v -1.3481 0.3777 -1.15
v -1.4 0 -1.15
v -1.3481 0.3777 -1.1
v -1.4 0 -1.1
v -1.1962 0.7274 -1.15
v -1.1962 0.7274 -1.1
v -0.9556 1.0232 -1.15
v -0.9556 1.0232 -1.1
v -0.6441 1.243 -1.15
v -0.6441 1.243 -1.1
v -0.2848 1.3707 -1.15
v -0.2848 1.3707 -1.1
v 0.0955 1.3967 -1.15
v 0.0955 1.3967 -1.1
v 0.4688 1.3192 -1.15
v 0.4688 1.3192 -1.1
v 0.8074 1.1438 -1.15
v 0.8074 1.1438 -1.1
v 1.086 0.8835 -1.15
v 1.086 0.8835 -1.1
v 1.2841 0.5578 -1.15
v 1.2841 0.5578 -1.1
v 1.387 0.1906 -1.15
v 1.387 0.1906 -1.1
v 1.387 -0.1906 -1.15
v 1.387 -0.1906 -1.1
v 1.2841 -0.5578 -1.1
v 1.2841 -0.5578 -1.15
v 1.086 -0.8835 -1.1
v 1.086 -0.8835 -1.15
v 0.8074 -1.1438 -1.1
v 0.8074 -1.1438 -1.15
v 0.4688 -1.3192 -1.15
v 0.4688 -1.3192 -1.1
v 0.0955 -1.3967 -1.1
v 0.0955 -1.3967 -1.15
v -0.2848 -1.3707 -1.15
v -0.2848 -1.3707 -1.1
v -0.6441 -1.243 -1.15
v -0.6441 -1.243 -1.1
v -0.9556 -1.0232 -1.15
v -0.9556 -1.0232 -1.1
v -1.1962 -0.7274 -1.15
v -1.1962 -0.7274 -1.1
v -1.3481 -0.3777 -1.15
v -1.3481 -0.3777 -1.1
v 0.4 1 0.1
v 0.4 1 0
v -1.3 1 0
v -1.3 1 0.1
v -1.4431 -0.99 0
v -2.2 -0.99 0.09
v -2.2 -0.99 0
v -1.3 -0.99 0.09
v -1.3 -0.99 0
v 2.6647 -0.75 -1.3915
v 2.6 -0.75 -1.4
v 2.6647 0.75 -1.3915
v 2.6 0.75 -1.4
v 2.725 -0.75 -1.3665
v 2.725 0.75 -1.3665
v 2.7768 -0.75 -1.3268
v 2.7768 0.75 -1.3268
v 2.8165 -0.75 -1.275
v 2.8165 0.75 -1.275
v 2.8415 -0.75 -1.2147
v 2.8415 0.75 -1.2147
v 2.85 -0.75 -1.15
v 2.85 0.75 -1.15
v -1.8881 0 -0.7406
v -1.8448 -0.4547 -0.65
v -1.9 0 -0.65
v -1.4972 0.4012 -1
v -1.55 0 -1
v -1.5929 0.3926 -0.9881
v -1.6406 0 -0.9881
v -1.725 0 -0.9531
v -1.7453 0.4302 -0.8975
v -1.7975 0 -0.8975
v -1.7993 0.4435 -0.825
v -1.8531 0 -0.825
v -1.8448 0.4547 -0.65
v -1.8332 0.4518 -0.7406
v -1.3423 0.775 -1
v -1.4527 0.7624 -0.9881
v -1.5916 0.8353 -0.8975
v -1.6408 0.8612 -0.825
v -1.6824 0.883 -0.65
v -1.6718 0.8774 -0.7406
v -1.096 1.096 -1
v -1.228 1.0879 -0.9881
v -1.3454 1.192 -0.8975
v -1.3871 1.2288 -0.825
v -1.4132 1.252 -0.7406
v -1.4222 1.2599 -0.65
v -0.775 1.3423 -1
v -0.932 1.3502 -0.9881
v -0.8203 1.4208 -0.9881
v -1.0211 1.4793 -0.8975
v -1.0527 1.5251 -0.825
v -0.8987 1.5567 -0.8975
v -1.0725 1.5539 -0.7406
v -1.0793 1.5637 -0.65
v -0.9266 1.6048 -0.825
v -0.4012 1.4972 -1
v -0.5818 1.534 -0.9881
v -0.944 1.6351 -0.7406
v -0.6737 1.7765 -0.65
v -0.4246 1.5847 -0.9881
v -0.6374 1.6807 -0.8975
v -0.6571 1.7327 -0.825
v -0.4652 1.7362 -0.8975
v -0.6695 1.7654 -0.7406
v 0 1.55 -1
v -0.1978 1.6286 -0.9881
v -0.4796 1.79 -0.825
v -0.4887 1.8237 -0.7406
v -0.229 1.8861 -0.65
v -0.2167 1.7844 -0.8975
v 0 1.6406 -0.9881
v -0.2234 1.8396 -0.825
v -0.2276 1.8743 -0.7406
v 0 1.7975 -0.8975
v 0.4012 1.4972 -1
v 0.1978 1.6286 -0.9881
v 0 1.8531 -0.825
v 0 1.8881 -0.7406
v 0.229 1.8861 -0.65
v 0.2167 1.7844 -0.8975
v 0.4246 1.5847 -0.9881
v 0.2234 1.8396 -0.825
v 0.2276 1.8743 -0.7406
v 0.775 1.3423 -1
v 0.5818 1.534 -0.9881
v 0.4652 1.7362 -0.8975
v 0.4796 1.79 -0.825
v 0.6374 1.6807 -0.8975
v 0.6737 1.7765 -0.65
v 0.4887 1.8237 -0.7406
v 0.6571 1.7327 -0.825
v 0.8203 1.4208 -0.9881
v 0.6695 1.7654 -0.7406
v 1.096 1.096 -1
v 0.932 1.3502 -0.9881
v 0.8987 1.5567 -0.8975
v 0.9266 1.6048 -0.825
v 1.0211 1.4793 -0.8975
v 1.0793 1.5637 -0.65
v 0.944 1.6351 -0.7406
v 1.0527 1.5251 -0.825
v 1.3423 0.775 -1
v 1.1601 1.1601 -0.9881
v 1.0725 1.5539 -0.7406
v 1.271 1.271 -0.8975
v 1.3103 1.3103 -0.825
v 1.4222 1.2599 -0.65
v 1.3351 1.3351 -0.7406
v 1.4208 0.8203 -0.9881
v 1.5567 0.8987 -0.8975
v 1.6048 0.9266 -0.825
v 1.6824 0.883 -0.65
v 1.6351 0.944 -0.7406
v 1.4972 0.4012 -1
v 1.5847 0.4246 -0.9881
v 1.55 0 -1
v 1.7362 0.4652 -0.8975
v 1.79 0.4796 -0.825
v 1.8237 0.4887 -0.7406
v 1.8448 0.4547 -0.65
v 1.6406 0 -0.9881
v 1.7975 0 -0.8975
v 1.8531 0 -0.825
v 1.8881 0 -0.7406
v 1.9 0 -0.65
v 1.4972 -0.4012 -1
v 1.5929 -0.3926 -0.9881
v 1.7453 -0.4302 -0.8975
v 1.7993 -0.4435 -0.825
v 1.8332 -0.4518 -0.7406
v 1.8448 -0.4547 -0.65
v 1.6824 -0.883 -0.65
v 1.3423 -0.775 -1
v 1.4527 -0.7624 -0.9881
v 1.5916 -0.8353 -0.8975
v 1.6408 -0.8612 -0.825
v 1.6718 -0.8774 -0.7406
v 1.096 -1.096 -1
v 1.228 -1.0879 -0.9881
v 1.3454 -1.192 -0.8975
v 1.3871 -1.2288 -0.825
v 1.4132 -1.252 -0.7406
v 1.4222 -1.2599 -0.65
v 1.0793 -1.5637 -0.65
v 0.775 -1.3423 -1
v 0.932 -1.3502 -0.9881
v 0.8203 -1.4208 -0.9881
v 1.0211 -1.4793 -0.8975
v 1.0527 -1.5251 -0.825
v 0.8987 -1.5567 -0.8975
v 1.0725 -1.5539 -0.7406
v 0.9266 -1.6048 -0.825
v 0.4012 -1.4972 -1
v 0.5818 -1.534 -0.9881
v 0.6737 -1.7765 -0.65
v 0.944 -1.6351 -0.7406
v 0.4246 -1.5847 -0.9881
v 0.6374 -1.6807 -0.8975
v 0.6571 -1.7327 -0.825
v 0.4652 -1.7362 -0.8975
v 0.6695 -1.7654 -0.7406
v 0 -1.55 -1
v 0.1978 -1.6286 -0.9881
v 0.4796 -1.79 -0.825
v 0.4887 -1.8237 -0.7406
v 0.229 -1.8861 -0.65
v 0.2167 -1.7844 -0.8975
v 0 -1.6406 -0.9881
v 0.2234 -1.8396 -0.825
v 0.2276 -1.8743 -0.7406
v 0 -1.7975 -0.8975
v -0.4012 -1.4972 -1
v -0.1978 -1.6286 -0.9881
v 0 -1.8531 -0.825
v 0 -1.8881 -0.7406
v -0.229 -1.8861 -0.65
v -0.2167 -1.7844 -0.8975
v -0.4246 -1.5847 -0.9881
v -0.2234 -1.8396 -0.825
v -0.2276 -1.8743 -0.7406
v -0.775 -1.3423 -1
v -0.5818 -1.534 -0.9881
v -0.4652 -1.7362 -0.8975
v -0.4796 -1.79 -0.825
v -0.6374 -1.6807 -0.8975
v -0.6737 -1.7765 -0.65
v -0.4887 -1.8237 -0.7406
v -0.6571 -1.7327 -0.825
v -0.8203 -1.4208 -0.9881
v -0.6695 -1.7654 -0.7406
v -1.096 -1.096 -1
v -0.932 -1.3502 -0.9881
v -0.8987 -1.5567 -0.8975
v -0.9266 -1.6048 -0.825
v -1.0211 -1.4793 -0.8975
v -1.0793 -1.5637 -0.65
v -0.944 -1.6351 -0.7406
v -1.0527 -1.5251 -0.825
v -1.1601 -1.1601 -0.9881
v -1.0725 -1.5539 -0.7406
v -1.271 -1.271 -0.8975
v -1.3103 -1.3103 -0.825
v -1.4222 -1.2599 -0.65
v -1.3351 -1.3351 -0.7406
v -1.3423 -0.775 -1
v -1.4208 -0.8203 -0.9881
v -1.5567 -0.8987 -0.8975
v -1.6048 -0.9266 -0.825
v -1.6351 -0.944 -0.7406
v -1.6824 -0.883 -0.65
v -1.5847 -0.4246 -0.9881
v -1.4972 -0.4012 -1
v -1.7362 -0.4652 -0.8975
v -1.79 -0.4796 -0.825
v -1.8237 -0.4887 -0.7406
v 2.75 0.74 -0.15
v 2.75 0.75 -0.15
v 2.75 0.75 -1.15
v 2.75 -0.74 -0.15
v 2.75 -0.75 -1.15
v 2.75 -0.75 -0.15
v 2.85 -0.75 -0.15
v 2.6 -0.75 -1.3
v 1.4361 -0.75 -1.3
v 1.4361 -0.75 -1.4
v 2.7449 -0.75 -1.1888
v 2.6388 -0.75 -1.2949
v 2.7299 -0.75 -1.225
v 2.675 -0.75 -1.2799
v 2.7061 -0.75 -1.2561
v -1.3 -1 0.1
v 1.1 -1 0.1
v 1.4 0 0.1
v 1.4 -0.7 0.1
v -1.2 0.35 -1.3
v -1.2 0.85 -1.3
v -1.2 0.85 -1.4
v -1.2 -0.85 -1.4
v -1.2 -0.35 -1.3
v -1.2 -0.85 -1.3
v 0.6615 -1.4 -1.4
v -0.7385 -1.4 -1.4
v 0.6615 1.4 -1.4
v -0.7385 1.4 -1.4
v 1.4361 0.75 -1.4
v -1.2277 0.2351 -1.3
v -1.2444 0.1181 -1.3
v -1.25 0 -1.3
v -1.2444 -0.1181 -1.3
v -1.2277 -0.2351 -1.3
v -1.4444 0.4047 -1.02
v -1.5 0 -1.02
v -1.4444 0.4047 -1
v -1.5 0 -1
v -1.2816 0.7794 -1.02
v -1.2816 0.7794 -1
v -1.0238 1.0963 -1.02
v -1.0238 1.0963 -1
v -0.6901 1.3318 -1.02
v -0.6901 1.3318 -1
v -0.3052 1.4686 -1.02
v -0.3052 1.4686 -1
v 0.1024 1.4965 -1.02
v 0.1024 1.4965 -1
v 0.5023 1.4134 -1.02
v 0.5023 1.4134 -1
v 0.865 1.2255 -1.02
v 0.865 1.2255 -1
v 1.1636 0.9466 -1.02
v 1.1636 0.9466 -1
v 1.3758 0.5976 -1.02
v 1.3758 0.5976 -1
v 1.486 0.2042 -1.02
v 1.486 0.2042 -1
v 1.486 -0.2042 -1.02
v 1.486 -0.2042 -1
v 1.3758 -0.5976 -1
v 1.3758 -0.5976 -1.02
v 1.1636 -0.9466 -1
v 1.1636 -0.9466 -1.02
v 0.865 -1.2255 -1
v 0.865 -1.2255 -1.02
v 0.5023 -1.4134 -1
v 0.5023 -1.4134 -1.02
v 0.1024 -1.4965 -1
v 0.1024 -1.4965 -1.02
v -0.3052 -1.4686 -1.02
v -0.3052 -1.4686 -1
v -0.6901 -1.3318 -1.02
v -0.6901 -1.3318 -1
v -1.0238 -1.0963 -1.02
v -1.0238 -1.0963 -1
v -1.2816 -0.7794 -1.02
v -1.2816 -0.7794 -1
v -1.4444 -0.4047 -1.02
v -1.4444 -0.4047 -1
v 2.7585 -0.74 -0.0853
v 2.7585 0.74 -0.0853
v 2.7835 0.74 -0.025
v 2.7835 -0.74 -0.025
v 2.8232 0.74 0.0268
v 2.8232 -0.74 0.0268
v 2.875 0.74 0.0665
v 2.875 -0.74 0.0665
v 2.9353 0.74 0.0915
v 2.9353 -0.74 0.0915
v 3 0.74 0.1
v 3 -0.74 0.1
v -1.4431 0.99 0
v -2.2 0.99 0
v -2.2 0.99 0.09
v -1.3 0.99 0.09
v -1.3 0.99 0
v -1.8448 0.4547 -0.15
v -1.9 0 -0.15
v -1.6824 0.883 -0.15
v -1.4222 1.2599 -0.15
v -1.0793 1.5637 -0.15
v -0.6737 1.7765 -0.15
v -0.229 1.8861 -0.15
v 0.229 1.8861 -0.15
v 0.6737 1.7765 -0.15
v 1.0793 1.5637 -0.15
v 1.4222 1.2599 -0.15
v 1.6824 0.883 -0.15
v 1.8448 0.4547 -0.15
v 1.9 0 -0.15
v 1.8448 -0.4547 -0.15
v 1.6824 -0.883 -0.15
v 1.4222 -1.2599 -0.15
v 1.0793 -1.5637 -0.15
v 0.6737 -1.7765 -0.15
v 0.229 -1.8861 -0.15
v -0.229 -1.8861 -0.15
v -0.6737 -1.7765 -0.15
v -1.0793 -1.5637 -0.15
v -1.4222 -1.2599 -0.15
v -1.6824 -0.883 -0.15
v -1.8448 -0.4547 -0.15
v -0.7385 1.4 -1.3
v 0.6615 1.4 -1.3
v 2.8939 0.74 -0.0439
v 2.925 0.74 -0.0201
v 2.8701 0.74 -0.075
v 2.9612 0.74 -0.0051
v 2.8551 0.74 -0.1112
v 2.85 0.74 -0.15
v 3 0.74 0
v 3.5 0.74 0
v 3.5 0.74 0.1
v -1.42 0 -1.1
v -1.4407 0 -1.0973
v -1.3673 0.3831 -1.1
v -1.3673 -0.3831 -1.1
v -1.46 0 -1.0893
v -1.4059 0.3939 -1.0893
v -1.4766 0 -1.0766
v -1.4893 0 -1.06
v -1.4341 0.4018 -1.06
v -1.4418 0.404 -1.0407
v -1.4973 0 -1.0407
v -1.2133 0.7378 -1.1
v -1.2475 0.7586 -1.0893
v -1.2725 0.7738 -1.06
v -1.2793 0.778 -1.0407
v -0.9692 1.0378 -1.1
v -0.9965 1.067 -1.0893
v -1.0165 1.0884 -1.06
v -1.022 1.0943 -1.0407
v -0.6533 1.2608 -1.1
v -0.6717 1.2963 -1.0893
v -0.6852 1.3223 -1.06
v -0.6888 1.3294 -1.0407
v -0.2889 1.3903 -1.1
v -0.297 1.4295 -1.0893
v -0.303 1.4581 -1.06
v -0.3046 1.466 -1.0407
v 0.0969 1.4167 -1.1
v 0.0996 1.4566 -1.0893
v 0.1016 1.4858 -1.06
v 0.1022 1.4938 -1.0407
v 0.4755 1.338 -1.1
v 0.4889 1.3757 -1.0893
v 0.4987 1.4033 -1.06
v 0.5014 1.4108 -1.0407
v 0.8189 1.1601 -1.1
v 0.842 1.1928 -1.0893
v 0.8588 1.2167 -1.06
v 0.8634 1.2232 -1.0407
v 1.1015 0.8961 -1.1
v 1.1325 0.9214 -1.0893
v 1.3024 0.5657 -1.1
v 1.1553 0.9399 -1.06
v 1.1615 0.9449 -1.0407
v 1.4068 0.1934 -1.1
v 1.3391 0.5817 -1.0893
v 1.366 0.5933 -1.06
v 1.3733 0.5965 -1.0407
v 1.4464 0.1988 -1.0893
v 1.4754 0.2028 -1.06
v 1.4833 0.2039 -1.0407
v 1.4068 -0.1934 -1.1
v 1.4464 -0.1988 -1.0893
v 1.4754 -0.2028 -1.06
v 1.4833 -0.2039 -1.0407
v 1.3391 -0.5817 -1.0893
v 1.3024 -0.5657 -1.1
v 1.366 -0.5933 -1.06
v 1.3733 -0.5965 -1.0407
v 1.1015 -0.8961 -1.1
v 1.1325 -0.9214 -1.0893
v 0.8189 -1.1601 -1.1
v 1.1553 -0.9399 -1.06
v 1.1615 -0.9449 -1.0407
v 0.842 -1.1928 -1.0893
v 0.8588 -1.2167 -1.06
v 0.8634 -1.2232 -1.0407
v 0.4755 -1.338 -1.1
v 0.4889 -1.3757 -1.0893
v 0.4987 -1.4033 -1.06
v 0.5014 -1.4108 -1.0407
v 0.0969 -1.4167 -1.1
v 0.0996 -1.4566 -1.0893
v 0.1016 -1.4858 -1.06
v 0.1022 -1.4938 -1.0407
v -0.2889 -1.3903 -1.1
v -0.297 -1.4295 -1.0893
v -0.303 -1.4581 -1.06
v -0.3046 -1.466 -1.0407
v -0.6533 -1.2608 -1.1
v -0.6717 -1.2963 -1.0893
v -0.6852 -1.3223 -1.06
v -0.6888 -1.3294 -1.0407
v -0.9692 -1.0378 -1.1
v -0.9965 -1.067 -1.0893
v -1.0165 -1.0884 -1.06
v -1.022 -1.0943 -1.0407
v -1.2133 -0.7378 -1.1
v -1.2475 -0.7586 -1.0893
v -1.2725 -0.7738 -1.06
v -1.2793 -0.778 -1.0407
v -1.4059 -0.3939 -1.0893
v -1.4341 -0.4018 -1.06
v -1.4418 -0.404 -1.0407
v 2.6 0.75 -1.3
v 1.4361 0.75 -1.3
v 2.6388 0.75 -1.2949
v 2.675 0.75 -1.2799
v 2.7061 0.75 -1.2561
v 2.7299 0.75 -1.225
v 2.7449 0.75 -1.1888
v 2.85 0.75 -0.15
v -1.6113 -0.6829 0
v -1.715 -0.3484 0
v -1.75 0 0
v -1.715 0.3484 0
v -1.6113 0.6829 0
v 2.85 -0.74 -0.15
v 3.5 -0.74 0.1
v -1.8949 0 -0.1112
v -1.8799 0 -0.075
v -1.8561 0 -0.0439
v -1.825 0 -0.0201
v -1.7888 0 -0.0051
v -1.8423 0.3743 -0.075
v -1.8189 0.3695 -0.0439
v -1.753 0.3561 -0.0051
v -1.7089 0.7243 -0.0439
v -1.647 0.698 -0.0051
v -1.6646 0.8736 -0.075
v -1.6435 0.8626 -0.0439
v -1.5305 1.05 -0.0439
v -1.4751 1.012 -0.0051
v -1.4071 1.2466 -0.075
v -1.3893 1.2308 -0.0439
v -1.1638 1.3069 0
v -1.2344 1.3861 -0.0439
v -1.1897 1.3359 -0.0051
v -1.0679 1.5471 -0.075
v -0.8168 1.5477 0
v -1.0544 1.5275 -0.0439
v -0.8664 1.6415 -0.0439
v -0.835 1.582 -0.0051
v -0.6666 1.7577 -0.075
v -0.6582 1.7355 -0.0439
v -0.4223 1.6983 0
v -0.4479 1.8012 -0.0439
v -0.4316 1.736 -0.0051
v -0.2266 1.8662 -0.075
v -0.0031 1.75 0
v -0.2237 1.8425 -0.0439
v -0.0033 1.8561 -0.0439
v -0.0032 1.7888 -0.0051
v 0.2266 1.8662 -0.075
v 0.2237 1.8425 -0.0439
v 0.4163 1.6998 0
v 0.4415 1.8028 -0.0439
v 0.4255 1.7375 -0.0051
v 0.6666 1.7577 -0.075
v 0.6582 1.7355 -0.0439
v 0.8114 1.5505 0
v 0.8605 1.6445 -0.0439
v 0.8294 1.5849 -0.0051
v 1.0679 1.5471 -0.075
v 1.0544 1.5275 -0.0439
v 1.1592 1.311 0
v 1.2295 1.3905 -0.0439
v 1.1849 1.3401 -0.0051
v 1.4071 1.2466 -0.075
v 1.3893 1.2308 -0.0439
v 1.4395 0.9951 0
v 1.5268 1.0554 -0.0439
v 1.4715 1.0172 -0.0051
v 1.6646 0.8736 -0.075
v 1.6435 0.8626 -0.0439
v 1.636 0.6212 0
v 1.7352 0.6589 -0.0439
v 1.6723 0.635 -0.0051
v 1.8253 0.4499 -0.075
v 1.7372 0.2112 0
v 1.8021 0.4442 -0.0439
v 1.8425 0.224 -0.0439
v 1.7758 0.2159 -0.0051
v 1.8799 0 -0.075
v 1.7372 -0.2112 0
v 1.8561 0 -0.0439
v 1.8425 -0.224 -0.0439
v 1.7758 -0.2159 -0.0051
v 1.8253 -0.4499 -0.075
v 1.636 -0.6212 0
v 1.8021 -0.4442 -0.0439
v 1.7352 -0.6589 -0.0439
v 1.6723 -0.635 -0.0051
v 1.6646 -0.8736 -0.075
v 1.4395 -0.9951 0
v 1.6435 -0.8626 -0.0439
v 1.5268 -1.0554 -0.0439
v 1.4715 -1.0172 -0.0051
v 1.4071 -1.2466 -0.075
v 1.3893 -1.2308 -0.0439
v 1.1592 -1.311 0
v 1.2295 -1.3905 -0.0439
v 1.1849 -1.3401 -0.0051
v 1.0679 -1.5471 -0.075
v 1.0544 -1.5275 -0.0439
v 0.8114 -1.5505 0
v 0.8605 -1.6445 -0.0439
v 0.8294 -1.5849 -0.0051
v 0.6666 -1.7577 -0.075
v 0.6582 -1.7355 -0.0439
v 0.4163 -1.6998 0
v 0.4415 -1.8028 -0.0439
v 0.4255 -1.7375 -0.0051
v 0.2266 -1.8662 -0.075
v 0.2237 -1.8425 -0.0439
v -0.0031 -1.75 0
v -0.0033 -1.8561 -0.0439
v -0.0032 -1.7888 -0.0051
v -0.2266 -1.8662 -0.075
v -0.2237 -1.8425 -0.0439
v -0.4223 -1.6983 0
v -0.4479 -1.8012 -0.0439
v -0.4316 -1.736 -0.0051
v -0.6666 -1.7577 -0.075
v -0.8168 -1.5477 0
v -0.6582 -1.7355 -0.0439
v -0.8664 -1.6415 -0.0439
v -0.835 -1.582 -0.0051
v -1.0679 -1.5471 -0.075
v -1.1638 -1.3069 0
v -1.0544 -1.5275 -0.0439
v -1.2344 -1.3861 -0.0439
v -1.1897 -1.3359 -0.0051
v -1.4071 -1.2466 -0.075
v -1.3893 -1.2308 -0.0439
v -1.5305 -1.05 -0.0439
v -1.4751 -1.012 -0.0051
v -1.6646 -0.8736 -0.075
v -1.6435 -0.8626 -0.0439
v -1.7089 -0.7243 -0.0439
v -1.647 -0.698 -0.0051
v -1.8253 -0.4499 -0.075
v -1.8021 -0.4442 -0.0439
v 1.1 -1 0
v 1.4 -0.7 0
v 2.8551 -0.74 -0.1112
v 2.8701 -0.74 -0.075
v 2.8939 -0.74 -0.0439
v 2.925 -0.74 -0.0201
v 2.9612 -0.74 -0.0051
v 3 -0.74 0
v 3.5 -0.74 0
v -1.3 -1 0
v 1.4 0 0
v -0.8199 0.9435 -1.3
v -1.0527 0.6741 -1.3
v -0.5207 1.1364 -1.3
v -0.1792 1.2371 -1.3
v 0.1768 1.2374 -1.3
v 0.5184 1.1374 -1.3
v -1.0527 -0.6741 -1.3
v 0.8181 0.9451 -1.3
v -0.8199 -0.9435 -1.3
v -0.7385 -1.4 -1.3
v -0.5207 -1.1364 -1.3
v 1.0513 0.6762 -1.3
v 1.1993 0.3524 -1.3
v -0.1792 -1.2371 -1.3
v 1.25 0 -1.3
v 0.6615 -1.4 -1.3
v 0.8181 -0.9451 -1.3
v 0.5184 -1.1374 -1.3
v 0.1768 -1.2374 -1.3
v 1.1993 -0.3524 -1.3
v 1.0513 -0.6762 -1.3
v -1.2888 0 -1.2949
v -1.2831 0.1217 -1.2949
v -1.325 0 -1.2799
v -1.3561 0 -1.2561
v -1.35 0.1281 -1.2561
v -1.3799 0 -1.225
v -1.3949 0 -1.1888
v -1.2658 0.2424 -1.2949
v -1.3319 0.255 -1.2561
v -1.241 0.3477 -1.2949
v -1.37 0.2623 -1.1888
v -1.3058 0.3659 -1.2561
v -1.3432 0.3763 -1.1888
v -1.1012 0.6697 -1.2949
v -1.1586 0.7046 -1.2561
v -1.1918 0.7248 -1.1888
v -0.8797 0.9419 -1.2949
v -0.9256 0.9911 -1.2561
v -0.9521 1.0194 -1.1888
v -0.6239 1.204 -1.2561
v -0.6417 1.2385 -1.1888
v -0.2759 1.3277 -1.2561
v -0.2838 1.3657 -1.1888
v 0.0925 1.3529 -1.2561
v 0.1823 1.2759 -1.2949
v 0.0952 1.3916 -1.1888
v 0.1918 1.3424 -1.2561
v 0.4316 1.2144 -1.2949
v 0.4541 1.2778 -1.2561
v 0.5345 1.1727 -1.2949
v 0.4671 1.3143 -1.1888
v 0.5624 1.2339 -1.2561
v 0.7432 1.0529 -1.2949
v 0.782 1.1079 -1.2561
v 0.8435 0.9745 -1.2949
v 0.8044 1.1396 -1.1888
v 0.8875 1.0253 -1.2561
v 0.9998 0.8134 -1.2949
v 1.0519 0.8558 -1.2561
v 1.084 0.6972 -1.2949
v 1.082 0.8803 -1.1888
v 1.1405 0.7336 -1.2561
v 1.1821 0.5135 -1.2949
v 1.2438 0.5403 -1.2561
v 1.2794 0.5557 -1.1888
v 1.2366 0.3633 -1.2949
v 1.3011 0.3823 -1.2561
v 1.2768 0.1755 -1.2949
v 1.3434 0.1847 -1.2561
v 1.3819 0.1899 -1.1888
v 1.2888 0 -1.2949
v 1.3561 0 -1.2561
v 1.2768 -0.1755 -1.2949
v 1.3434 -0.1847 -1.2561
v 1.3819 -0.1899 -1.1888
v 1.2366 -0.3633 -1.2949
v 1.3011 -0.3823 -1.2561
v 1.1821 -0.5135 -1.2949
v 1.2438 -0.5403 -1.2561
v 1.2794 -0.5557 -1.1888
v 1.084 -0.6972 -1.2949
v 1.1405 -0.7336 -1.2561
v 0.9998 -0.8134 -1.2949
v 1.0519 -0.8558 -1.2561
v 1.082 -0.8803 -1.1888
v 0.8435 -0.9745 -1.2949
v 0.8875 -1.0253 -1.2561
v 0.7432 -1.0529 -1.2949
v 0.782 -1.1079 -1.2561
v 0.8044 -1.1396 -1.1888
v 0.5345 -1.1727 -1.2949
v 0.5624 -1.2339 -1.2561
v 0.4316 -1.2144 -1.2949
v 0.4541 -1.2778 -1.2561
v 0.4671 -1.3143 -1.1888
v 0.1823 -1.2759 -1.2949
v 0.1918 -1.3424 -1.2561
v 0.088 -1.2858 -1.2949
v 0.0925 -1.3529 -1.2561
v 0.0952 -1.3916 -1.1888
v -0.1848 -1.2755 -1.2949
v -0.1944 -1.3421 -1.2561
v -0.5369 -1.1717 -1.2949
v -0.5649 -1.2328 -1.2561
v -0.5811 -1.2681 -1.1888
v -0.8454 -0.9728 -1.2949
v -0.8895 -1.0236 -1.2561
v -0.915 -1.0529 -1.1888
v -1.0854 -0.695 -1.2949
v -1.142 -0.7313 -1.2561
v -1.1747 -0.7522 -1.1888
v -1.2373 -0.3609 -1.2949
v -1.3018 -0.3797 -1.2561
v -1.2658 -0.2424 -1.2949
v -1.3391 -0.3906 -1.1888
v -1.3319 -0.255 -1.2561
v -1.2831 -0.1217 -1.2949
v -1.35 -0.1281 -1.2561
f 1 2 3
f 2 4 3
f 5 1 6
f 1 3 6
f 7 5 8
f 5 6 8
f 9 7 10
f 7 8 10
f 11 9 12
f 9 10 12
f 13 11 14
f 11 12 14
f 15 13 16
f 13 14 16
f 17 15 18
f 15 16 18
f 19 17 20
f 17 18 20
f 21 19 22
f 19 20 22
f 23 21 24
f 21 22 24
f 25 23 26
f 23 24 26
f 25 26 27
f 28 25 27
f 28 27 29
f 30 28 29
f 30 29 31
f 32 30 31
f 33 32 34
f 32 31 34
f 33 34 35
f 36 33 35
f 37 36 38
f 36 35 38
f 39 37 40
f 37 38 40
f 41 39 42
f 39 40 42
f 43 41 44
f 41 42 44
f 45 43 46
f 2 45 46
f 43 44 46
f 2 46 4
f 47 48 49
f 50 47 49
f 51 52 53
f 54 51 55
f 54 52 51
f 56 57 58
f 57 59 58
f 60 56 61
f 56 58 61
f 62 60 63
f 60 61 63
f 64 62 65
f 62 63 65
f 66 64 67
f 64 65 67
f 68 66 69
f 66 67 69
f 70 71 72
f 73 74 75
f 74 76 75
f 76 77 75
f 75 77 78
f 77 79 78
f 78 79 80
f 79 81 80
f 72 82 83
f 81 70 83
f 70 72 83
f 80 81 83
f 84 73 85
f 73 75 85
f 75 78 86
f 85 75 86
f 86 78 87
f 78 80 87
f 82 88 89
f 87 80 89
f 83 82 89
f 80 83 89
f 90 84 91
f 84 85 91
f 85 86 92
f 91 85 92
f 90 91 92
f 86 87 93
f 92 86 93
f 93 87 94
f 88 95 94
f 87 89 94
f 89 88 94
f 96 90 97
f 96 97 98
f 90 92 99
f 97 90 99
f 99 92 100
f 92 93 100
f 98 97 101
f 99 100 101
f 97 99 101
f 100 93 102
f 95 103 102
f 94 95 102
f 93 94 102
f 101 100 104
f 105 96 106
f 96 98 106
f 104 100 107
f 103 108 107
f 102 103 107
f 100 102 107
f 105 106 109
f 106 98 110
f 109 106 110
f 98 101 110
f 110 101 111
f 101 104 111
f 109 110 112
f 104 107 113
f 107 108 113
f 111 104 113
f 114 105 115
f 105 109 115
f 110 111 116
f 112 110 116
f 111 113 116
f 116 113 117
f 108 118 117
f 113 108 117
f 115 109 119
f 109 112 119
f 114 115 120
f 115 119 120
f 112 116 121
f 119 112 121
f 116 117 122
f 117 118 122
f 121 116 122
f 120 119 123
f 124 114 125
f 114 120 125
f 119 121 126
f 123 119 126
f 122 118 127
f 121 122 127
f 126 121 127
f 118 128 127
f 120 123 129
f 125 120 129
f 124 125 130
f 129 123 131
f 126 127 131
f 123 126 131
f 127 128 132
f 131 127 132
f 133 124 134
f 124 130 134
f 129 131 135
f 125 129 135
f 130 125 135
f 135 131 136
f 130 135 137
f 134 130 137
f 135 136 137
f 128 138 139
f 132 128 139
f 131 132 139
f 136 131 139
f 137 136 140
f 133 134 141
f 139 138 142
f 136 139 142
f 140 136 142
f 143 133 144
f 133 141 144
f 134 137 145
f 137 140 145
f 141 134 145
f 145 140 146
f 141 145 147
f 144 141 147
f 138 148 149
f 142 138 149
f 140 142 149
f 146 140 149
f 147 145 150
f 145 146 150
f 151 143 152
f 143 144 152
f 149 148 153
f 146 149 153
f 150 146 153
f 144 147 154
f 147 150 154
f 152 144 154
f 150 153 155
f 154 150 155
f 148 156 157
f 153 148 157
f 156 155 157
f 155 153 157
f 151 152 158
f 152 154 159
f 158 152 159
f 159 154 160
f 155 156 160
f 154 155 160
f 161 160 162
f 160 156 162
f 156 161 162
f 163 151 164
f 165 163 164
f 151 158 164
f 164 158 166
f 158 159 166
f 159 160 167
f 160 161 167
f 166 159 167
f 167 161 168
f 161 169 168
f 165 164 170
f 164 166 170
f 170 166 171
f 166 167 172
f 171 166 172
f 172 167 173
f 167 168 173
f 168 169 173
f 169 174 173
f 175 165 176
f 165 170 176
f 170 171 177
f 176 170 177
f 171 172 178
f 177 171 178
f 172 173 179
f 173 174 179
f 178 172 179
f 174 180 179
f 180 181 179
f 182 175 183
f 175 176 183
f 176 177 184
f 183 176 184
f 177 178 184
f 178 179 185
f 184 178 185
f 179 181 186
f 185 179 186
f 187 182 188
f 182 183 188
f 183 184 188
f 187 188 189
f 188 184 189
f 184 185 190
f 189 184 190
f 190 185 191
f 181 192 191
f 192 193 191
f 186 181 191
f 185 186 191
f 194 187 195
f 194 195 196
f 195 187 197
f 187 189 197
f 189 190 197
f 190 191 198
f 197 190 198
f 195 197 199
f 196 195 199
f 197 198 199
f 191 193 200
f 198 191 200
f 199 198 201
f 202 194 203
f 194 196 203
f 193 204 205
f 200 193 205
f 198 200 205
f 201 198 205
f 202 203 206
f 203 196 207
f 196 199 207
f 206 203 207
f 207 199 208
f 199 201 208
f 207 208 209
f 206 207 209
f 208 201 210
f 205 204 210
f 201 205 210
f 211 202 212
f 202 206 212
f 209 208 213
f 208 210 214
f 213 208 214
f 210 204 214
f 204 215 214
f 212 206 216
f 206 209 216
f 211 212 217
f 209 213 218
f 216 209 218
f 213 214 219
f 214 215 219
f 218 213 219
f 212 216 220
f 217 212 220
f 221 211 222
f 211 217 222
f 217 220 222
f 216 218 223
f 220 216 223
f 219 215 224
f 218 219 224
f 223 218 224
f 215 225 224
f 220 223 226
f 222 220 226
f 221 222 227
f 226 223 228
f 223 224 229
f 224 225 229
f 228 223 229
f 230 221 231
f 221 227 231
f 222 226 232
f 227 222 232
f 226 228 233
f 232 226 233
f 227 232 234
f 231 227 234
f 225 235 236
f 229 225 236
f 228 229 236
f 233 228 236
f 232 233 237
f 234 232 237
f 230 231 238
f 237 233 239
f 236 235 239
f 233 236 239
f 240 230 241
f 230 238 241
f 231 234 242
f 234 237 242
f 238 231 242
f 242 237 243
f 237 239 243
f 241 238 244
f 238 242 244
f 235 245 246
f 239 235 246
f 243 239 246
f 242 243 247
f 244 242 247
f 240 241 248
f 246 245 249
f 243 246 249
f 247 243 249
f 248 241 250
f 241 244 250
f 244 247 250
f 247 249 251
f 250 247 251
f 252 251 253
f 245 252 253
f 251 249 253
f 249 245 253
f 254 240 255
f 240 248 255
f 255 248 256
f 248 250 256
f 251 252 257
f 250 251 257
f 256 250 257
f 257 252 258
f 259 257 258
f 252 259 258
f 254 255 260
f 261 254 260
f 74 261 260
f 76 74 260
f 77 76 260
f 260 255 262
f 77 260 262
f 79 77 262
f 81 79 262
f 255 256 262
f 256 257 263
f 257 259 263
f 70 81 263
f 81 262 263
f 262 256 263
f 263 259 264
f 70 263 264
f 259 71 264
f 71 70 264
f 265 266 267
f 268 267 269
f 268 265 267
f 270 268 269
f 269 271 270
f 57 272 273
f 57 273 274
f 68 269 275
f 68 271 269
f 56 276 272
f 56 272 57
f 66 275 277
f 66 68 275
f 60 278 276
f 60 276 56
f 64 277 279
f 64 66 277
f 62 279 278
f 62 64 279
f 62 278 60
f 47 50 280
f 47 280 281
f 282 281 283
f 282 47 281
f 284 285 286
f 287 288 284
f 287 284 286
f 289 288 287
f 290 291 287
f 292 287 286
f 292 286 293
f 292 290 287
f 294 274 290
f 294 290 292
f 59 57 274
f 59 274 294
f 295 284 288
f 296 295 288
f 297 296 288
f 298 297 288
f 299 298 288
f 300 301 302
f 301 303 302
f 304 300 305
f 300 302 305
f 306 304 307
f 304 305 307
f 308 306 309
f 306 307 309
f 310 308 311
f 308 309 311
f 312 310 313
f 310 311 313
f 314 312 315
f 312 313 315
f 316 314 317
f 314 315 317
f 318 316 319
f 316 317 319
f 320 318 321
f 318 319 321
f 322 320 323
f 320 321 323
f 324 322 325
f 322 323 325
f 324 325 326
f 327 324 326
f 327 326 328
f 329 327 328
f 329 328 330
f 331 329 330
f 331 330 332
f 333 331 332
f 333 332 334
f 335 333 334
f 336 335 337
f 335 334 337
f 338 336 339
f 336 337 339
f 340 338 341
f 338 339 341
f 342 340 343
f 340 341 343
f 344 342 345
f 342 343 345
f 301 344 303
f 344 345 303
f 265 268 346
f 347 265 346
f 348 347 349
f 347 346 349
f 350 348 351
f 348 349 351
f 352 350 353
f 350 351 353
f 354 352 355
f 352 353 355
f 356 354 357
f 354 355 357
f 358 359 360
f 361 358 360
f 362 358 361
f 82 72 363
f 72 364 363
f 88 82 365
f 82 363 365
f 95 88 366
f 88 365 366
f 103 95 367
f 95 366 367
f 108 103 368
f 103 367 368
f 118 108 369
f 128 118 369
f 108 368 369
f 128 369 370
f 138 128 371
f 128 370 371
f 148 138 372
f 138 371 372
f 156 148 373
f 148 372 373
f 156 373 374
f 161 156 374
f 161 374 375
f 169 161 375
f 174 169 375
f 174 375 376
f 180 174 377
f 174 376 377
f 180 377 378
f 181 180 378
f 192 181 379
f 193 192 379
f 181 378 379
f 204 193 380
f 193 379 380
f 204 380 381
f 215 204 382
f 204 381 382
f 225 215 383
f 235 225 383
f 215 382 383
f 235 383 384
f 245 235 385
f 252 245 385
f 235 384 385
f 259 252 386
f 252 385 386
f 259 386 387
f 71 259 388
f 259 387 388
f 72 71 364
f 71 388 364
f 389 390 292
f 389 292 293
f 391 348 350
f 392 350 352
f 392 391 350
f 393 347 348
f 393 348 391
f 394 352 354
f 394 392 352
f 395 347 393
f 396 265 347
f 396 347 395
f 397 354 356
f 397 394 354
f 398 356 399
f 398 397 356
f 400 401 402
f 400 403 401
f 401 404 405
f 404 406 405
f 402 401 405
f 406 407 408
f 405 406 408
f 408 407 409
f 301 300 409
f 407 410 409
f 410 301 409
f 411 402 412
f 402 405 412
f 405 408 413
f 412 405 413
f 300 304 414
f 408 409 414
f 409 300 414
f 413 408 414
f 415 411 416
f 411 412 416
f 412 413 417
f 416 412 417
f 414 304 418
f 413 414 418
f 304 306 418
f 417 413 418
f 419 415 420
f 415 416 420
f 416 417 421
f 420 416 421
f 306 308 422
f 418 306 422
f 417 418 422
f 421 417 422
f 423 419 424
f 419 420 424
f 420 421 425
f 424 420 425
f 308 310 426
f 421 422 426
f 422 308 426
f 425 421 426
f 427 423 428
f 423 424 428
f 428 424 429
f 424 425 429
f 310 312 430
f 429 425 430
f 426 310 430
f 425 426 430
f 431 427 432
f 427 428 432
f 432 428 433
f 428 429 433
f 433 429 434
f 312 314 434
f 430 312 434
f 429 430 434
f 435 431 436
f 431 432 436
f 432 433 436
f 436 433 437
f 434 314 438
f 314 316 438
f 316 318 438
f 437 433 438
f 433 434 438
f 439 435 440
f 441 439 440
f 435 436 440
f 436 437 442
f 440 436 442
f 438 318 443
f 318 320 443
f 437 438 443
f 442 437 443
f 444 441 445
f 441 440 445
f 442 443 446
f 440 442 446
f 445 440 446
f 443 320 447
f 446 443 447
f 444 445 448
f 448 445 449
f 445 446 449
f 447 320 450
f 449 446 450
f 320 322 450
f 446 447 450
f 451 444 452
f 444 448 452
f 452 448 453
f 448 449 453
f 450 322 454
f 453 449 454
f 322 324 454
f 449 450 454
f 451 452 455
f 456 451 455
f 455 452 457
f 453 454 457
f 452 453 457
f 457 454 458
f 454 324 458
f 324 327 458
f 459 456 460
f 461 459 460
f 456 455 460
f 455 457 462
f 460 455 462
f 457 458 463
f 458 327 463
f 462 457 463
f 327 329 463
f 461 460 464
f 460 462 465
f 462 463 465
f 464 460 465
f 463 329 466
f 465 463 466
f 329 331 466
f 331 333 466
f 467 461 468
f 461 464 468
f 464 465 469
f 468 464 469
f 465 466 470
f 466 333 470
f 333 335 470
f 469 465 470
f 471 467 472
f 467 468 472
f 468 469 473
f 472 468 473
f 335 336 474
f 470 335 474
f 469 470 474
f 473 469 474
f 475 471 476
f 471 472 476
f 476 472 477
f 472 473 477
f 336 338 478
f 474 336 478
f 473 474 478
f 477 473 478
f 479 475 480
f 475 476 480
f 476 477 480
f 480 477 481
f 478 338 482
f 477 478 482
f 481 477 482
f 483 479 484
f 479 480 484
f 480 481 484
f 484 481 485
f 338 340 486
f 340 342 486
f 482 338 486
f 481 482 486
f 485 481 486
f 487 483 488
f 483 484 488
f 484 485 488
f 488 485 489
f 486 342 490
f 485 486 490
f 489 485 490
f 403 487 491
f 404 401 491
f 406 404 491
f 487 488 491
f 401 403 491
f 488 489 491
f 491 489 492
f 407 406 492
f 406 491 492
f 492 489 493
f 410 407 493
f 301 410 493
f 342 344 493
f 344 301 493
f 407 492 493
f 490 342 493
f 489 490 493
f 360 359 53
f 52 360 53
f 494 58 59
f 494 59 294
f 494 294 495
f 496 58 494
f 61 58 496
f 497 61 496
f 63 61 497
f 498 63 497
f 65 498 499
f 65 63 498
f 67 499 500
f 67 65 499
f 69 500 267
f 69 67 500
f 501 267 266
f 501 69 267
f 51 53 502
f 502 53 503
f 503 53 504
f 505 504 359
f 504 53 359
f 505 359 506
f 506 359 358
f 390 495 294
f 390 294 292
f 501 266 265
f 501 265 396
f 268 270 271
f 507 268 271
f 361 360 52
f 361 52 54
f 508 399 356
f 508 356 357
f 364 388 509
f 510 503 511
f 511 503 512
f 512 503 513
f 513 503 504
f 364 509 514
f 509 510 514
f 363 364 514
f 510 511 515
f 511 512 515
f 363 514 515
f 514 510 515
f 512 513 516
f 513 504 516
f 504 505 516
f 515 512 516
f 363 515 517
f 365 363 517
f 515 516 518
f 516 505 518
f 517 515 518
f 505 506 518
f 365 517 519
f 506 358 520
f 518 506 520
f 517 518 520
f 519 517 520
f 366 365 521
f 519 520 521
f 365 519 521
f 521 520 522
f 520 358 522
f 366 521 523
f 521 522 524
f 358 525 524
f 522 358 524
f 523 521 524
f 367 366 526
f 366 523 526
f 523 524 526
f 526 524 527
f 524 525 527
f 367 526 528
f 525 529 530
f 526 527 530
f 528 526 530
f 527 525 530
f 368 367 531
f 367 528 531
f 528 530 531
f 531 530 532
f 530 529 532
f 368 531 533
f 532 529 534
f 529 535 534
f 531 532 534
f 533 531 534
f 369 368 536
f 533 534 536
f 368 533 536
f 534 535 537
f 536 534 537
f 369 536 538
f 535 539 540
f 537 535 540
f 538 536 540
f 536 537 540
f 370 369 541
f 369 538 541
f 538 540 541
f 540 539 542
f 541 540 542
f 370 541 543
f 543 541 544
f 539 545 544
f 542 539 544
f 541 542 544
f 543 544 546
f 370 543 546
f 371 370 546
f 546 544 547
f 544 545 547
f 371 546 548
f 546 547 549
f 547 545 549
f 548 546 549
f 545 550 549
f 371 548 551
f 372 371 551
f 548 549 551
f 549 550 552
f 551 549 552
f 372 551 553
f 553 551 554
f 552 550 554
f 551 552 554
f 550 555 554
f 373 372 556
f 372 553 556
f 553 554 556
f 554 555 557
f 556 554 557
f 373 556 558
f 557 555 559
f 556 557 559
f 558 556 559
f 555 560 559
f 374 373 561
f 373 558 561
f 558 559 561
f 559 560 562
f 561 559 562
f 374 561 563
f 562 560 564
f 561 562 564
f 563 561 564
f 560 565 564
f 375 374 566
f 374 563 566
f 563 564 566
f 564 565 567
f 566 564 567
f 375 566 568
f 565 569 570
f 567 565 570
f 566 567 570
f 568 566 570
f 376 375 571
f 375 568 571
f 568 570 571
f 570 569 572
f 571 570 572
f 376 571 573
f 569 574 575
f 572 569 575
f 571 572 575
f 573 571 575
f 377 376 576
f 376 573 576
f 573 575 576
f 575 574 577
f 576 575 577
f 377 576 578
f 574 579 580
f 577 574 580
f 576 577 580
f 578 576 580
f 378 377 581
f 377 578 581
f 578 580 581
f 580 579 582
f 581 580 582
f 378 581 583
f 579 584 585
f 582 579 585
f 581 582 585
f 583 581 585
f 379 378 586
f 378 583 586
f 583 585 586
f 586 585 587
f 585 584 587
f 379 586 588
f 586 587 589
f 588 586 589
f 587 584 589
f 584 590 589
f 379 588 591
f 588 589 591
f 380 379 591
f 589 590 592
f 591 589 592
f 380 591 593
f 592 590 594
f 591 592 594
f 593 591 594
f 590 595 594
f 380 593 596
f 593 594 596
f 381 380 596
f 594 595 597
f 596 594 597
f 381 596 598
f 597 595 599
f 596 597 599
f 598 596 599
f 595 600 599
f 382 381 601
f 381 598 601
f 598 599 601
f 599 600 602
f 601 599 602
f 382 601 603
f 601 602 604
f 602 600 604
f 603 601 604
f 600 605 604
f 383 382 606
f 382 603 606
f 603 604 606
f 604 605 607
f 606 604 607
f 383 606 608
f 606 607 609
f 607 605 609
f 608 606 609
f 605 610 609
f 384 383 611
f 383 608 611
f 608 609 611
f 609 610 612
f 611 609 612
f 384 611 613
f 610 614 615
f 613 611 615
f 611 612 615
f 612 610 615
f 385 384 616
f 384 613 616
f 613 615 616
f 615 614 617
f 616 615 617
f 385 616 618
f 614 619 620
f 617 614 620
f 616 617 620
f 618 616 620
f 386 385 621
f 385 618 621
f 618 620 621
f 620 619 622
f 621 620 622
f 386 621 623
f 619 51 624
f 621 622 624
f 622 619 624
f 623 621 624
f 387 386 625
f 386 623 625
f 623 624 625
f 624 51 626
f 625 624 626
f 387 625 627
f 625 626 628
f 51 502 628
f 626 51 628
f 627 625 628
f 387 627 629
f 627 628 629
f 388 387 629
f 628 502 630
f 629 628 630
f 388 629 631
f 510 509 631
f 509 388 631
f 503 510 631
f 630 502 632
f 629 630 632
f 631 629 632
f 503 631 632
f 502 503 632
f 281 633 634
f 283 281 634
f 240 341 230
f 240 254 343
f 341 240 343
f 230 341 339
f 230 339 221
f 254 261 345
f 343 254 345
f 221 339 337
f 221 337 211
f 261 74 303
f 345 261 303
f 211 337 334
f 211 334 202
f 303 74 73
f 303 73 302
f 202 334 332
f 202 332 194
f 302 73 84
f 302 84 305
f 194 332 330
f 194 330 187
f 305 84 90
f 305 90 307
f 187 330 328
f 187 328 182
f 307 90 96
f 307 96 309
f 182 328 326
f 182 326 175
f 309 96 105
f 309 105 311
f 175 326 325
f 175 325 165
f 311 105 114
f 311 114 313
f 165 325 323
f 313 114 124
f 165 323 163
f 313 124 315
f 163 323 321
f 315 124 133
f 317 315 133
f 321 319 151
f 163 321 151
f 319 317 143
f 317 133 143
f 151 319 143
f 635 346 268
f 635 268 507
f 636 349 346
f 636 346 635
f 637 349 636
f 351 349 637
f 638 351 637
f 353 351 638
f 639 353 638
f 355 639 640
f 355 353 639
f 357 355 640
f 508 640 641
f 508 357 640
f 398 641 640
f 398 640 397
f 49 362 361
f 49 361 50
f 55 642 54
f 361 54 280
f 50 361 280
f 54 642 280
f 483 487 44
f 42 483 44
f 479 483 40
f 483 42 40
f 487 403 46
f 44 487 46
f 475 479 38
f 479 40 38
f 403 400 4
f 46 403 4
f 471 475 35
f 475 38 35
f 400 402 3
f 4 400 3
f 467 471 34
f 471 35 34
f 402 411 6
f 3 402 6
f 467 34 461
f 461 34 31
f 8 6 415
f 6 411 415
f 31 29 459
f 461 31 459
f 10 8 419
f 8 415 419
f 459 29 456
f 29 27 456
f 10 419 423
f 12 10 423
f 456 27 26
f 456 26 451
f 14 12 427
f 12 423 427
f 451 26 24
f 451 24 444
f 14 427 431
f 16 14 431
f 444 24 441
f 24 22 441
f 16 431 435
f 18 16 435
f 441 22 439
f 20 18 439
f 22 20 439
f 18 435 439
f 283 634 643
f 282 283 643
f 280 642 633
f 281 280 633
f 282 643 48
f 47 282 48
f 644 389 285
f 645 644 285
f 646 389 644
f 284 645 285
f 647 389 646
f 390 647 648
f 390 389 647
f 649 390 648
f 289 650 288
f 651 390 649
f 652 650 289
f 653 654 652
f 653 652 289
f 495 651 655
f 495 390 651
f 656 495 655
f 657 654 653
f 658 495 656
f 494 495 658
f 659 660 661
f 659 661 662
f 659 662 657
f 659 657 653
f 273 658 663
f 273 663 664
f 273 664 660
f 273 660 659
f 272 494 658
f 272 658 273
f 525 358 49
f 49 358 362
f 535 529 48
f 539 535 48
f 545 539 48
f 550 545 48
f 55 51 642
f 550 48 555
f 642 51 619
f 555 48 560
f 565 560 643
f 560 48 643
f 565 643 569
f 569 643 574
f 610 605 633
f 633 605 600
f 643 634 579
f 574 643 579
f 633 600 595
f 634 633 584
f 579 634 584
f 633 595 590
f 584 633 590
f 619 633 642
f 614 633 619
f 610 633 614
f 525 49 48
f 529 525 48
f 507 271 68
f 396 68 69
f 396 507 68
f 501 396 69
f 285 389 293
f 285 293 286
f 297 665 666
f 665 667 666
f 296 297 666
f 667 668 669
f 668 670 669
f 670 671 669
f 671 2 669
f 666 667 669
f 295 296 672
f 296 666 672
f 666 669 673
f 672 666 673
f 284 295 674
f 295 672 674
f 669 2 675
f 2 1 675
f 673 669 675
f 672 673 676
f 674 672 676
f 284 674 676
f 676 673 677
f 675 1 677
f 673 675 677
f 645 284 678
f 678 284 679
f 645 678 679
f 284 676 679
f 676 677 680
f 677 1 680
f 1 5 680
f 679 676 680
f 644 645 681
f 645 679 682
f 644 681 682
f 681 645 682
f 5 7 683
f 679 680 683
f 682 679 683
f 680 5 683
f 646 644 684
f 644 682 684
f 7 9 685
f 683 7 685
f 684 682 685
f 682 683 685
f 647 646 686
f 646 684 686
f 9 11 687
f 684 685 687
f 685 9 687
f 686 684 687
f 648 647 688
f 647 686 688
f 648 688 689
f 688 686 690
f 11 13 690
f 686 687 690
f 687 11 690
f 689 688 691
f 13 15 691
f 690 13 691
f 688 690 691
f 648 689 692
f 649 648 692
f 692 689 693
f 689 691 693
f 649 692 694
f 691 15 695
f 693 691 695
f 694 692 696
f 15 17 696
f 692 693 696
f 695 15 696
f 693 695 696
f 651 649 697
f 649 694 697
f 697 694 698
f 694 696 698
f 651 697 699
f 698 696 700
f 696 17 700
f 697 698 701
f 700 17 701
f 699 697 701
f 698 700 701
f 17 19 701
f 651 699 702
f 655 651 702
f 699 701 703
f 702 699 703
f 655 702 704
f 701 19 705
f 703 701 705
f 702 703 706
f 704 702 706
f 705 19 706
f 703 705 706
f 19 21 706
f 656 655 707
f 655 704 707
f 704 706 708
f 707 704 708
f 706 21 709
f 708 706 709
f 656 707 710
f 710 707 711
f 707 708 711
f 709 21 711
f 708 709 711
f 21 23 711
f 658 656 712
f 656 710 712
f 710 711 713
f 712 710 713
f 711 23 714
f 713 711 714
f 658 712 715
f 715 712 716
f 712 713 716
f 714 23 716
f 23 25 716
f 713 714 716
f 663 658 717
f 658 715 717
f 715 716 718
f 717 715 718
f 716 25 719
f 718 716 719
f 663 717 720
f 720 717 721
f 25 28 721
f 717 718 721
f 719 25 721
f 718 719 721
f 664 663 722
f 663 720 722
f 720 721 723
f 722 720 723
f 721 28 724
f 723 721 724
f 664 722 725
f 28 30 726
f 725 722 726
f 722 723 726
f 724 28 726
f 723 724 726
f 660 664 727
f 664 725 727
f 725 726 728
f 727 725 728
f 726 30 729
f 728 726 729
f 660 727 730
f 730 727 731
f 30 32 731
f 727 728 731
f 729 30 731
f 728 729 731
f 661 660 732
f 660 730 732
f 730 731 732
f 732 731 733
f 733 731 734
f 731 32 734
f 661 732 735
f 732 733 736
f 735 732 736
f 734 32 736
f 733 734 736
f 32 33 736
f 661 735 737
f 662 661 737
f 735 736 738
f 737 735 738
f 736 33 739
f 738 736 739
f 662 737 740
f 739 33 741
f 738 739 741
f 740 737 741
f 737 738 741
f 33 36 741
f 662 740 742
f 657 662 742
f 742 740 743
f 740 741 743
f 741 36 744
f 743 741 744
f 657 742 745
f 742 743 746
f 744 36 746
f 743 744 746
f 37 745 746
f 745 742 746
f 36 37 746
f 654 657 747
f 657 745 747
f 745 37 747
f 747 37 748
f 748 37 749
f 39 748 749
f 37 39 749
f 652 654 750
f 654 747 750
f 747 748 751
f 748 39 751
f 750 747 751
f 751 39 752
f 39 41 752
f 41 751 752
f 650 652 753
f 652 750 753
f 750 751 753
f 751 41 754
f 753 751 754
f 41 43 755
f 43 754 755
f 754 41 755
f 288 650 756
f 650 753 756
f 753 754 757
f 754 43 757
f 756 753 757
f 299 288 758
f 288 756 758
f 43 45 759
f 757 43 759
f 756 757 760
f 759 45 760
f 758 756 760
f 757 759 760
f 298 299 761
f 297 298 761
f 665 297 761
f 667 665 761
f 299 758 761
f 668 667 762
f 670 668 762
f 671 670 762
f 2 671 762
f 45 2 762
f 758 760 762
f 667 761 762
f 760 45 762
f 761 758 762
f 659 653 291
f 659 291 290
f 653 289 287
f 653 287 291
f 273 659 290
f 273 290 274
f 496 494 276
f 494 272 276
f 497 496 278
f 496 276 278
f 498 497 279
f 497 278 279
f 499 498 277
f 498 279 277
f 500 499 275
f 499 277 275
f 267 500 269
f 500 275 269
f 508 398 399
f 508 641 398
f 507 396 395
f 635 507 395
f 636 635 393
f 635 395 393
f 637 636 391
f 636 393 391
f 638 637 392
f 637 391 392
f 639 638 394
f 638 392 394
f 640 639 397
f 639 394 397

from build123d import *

# Parameters (mm, degrees)
BOSS_EXTRUDE1_DEPTH = 0.1
SKETCH4_W           = 0.9
SKETCH4_H           = 2
CUT_EXTRUDE1_DEPTH  = 0.01
SKETCH5_W           = 0.9
SKETCH5_H           = 0.09
CUT_EXTRUDE2_DEPTH  = 0.01
SKETCH6_W           = 0.9
SKETCH6_H           = 0.09
CUT_EXTRUDE3_DEPTH  = 0.01
BOSS_EXTRUDE2_DEPTH = 0.1
SKETCH9_W           = 0.1
SKETCH9_H           = 1.5
SKETCH10_W          = 0.8
SKETCH10_H          = 0.25
CUT_EXTRUDE4_DEPTH  = 0.01
SKETCH11_W          = 0.8
SKETCH11_H          = 0.25
CUT_EXTRUDE5_DEPTH  = 0.01


with BuildPart() as part:
    # Sketch1 → Revolve1 (revolve)
    with BuildSketch(Plane(origin=(0, 0, 0), x_dir=(1, 0, 0), z_dir=(0, 1, 0))):
        with BuildLine():
            Line((0, 0), (0, 1.3))
            Line((0, 1.3), (-1.25, 1.3))
            ThreePointArc((-1.25, 1.3), (-1.356066017, 1.256066017), (-1.4, 1.15))
            Line((-1.4, 1.15), (-1.4, 1.1))
            Line((-1.4, 1.1), (-1.42, 1.1))
            ThreePointArc((-1.42, 1.1), (-1.476568542, 1.076568542), (-1.5, 1.02))
            Line((-1.5, 1.02), (-1.5, 1))
            Line((-1.5, 1), (-1.55, 1))
            ThreePointArc((-1.55, 1), (-1.797487373, 0.897487373), (-1.9, 0.65))
            Line((-1.9, 0.65), (-1.9, 0.15))
            ThreePointArc((-1.9, 0.15), (-1.856066017, 0.043933983), (-1.75, 0))
            Line((-1.75, 0), (0, 0))
        make_face()
    revolve(axis=Axis((0, 0, 0), (0, 0, -1)))

    # Sketch2 → Boss-Extrude1 (add)
    with BuildSketch(Plane.XY):
        Polygon((-2.2, 1), (-2.2, -1), (1.1, -1), (1.4, -0.7), (1.4, 0), (0.4, 1), align=None)
    extrude(amount=BOSS_EXTRUDE1_DEPTH)

    # Sketch4 → Cut-Extrude1 (cut)
    with BuildSketch(Plane.XY.offset(0.1)):
        with Locations((-1.75, 0)):
            Rectangle(SKETCH4_W, SKETCH4_H)
    extrude(amount=-CUT_EXTRUDE1_DEPTH, mode=Mode.SUBTRACT)

    # Sketch5 → Cut-Extrude2 (cut)
    with BuildSketch(Plane(origin=(0, 1, 0), x_dir=(1, 0, 0), z_dir=(0, 1, 0))):
        with Locations((-1.75, -0.045)):
            Rectangle(SKETCH5_W, SKETCH5_H)
    extrude(amount=-CUT_EXTRUDE2_DEPTH, mode=Mode.SUBTRACT)

    # Sketch6 → Cut-Extrude3 (cut)
    with BuildSketch(Plane.XZ.offset(1)):
        with Locations((-1.75, 0.045)):
            Rectangle(SKETCH6_W, SKETCH6_H)
    extrude(amount=-CUT_EXTRUDE3_DEPTH, mode=Mode.SUBTRACT)

    # Sketch7 → Boss-Extrude2 (add)
    with BuildSketch(Plane(origin=(0, 0, -1.3), x_dir=(-1, 0, 0), z_dir=(0, 0, -1))):
        Polygon((1.2, 0.85), (1.2, -0.85), (0.738495203, -1.4), (-0.661504797, -1.4), (-1.436144632, -0.75), (-2.5, -0.75), (-2.5, 0.75), (-1.436144632, 0.75), (-0.661504797, 1.4), (0.738495203, 1.4), align=None)
    extrude(amount=BOSS_EXTRUDE2_DEPTH)

    # Sweep1: sweep along a path in Sketch8
    with BuildLine(Plane(origin=(0, 0, 0), x_dir=(1, 0, 0), z_dir=(0, 1, 0))) as sweep1_path:
        Line((2.5, 1.35), (2.599997807, 1.35))
        ThreePointArc((2.599997807, 1.35), (2.741419163, 1.291421356), (2.799997807, 1.15))
        Line((2.799997807, 1.15), (2.799997807, 0.15))
        ThreePointArc((2.799997807, 0.15), (2.858576451, 0.008578644), (2.999997807, -0.05))
        Line((2.999997807, -0.05), (3.499997807, -0.05))
    # Sketch9 → Sweep1 (sweep)
    with BuildSketch(Plane(origin=(2.5, 0, 0), x_dir=(0, 0, -1), z_dir=(1, 0, 0))):
        with Locations((1.35, 0)):
            Rectangle(SKETCH9_W, SKETCH9_H)
    sweep(path=sweep1_path.line)

    # Sketch10 → Cut-Extrude4 (cut)
    with BuildSketch(Plane(origin=(0, 0.75, 0), x_dir=(1, 0, 0), z_dir=(0, 1, 0))):
        with Locations((3.099997807, 0.025)):
            Rectangle(SKETCH10_W, SKETCH10_H)
    extrude(amount=-CUT_EXTRUDE4_DEPTH, mode=Mode.SUBTRACT)

    # Sketch11 → Cut-Extrude5 (cut)
    with BuildSketch(Plane.XZ.offset(0.75)):
        with Locations((3.099997807, -0.025)):
            Rectangle(SKETCH11_W, SKETCH11_H)
    extrude(amount=-CUT_EXTRUDE5_DEPTH, mode=Mode.SUBTRACT)


solid = part.part
